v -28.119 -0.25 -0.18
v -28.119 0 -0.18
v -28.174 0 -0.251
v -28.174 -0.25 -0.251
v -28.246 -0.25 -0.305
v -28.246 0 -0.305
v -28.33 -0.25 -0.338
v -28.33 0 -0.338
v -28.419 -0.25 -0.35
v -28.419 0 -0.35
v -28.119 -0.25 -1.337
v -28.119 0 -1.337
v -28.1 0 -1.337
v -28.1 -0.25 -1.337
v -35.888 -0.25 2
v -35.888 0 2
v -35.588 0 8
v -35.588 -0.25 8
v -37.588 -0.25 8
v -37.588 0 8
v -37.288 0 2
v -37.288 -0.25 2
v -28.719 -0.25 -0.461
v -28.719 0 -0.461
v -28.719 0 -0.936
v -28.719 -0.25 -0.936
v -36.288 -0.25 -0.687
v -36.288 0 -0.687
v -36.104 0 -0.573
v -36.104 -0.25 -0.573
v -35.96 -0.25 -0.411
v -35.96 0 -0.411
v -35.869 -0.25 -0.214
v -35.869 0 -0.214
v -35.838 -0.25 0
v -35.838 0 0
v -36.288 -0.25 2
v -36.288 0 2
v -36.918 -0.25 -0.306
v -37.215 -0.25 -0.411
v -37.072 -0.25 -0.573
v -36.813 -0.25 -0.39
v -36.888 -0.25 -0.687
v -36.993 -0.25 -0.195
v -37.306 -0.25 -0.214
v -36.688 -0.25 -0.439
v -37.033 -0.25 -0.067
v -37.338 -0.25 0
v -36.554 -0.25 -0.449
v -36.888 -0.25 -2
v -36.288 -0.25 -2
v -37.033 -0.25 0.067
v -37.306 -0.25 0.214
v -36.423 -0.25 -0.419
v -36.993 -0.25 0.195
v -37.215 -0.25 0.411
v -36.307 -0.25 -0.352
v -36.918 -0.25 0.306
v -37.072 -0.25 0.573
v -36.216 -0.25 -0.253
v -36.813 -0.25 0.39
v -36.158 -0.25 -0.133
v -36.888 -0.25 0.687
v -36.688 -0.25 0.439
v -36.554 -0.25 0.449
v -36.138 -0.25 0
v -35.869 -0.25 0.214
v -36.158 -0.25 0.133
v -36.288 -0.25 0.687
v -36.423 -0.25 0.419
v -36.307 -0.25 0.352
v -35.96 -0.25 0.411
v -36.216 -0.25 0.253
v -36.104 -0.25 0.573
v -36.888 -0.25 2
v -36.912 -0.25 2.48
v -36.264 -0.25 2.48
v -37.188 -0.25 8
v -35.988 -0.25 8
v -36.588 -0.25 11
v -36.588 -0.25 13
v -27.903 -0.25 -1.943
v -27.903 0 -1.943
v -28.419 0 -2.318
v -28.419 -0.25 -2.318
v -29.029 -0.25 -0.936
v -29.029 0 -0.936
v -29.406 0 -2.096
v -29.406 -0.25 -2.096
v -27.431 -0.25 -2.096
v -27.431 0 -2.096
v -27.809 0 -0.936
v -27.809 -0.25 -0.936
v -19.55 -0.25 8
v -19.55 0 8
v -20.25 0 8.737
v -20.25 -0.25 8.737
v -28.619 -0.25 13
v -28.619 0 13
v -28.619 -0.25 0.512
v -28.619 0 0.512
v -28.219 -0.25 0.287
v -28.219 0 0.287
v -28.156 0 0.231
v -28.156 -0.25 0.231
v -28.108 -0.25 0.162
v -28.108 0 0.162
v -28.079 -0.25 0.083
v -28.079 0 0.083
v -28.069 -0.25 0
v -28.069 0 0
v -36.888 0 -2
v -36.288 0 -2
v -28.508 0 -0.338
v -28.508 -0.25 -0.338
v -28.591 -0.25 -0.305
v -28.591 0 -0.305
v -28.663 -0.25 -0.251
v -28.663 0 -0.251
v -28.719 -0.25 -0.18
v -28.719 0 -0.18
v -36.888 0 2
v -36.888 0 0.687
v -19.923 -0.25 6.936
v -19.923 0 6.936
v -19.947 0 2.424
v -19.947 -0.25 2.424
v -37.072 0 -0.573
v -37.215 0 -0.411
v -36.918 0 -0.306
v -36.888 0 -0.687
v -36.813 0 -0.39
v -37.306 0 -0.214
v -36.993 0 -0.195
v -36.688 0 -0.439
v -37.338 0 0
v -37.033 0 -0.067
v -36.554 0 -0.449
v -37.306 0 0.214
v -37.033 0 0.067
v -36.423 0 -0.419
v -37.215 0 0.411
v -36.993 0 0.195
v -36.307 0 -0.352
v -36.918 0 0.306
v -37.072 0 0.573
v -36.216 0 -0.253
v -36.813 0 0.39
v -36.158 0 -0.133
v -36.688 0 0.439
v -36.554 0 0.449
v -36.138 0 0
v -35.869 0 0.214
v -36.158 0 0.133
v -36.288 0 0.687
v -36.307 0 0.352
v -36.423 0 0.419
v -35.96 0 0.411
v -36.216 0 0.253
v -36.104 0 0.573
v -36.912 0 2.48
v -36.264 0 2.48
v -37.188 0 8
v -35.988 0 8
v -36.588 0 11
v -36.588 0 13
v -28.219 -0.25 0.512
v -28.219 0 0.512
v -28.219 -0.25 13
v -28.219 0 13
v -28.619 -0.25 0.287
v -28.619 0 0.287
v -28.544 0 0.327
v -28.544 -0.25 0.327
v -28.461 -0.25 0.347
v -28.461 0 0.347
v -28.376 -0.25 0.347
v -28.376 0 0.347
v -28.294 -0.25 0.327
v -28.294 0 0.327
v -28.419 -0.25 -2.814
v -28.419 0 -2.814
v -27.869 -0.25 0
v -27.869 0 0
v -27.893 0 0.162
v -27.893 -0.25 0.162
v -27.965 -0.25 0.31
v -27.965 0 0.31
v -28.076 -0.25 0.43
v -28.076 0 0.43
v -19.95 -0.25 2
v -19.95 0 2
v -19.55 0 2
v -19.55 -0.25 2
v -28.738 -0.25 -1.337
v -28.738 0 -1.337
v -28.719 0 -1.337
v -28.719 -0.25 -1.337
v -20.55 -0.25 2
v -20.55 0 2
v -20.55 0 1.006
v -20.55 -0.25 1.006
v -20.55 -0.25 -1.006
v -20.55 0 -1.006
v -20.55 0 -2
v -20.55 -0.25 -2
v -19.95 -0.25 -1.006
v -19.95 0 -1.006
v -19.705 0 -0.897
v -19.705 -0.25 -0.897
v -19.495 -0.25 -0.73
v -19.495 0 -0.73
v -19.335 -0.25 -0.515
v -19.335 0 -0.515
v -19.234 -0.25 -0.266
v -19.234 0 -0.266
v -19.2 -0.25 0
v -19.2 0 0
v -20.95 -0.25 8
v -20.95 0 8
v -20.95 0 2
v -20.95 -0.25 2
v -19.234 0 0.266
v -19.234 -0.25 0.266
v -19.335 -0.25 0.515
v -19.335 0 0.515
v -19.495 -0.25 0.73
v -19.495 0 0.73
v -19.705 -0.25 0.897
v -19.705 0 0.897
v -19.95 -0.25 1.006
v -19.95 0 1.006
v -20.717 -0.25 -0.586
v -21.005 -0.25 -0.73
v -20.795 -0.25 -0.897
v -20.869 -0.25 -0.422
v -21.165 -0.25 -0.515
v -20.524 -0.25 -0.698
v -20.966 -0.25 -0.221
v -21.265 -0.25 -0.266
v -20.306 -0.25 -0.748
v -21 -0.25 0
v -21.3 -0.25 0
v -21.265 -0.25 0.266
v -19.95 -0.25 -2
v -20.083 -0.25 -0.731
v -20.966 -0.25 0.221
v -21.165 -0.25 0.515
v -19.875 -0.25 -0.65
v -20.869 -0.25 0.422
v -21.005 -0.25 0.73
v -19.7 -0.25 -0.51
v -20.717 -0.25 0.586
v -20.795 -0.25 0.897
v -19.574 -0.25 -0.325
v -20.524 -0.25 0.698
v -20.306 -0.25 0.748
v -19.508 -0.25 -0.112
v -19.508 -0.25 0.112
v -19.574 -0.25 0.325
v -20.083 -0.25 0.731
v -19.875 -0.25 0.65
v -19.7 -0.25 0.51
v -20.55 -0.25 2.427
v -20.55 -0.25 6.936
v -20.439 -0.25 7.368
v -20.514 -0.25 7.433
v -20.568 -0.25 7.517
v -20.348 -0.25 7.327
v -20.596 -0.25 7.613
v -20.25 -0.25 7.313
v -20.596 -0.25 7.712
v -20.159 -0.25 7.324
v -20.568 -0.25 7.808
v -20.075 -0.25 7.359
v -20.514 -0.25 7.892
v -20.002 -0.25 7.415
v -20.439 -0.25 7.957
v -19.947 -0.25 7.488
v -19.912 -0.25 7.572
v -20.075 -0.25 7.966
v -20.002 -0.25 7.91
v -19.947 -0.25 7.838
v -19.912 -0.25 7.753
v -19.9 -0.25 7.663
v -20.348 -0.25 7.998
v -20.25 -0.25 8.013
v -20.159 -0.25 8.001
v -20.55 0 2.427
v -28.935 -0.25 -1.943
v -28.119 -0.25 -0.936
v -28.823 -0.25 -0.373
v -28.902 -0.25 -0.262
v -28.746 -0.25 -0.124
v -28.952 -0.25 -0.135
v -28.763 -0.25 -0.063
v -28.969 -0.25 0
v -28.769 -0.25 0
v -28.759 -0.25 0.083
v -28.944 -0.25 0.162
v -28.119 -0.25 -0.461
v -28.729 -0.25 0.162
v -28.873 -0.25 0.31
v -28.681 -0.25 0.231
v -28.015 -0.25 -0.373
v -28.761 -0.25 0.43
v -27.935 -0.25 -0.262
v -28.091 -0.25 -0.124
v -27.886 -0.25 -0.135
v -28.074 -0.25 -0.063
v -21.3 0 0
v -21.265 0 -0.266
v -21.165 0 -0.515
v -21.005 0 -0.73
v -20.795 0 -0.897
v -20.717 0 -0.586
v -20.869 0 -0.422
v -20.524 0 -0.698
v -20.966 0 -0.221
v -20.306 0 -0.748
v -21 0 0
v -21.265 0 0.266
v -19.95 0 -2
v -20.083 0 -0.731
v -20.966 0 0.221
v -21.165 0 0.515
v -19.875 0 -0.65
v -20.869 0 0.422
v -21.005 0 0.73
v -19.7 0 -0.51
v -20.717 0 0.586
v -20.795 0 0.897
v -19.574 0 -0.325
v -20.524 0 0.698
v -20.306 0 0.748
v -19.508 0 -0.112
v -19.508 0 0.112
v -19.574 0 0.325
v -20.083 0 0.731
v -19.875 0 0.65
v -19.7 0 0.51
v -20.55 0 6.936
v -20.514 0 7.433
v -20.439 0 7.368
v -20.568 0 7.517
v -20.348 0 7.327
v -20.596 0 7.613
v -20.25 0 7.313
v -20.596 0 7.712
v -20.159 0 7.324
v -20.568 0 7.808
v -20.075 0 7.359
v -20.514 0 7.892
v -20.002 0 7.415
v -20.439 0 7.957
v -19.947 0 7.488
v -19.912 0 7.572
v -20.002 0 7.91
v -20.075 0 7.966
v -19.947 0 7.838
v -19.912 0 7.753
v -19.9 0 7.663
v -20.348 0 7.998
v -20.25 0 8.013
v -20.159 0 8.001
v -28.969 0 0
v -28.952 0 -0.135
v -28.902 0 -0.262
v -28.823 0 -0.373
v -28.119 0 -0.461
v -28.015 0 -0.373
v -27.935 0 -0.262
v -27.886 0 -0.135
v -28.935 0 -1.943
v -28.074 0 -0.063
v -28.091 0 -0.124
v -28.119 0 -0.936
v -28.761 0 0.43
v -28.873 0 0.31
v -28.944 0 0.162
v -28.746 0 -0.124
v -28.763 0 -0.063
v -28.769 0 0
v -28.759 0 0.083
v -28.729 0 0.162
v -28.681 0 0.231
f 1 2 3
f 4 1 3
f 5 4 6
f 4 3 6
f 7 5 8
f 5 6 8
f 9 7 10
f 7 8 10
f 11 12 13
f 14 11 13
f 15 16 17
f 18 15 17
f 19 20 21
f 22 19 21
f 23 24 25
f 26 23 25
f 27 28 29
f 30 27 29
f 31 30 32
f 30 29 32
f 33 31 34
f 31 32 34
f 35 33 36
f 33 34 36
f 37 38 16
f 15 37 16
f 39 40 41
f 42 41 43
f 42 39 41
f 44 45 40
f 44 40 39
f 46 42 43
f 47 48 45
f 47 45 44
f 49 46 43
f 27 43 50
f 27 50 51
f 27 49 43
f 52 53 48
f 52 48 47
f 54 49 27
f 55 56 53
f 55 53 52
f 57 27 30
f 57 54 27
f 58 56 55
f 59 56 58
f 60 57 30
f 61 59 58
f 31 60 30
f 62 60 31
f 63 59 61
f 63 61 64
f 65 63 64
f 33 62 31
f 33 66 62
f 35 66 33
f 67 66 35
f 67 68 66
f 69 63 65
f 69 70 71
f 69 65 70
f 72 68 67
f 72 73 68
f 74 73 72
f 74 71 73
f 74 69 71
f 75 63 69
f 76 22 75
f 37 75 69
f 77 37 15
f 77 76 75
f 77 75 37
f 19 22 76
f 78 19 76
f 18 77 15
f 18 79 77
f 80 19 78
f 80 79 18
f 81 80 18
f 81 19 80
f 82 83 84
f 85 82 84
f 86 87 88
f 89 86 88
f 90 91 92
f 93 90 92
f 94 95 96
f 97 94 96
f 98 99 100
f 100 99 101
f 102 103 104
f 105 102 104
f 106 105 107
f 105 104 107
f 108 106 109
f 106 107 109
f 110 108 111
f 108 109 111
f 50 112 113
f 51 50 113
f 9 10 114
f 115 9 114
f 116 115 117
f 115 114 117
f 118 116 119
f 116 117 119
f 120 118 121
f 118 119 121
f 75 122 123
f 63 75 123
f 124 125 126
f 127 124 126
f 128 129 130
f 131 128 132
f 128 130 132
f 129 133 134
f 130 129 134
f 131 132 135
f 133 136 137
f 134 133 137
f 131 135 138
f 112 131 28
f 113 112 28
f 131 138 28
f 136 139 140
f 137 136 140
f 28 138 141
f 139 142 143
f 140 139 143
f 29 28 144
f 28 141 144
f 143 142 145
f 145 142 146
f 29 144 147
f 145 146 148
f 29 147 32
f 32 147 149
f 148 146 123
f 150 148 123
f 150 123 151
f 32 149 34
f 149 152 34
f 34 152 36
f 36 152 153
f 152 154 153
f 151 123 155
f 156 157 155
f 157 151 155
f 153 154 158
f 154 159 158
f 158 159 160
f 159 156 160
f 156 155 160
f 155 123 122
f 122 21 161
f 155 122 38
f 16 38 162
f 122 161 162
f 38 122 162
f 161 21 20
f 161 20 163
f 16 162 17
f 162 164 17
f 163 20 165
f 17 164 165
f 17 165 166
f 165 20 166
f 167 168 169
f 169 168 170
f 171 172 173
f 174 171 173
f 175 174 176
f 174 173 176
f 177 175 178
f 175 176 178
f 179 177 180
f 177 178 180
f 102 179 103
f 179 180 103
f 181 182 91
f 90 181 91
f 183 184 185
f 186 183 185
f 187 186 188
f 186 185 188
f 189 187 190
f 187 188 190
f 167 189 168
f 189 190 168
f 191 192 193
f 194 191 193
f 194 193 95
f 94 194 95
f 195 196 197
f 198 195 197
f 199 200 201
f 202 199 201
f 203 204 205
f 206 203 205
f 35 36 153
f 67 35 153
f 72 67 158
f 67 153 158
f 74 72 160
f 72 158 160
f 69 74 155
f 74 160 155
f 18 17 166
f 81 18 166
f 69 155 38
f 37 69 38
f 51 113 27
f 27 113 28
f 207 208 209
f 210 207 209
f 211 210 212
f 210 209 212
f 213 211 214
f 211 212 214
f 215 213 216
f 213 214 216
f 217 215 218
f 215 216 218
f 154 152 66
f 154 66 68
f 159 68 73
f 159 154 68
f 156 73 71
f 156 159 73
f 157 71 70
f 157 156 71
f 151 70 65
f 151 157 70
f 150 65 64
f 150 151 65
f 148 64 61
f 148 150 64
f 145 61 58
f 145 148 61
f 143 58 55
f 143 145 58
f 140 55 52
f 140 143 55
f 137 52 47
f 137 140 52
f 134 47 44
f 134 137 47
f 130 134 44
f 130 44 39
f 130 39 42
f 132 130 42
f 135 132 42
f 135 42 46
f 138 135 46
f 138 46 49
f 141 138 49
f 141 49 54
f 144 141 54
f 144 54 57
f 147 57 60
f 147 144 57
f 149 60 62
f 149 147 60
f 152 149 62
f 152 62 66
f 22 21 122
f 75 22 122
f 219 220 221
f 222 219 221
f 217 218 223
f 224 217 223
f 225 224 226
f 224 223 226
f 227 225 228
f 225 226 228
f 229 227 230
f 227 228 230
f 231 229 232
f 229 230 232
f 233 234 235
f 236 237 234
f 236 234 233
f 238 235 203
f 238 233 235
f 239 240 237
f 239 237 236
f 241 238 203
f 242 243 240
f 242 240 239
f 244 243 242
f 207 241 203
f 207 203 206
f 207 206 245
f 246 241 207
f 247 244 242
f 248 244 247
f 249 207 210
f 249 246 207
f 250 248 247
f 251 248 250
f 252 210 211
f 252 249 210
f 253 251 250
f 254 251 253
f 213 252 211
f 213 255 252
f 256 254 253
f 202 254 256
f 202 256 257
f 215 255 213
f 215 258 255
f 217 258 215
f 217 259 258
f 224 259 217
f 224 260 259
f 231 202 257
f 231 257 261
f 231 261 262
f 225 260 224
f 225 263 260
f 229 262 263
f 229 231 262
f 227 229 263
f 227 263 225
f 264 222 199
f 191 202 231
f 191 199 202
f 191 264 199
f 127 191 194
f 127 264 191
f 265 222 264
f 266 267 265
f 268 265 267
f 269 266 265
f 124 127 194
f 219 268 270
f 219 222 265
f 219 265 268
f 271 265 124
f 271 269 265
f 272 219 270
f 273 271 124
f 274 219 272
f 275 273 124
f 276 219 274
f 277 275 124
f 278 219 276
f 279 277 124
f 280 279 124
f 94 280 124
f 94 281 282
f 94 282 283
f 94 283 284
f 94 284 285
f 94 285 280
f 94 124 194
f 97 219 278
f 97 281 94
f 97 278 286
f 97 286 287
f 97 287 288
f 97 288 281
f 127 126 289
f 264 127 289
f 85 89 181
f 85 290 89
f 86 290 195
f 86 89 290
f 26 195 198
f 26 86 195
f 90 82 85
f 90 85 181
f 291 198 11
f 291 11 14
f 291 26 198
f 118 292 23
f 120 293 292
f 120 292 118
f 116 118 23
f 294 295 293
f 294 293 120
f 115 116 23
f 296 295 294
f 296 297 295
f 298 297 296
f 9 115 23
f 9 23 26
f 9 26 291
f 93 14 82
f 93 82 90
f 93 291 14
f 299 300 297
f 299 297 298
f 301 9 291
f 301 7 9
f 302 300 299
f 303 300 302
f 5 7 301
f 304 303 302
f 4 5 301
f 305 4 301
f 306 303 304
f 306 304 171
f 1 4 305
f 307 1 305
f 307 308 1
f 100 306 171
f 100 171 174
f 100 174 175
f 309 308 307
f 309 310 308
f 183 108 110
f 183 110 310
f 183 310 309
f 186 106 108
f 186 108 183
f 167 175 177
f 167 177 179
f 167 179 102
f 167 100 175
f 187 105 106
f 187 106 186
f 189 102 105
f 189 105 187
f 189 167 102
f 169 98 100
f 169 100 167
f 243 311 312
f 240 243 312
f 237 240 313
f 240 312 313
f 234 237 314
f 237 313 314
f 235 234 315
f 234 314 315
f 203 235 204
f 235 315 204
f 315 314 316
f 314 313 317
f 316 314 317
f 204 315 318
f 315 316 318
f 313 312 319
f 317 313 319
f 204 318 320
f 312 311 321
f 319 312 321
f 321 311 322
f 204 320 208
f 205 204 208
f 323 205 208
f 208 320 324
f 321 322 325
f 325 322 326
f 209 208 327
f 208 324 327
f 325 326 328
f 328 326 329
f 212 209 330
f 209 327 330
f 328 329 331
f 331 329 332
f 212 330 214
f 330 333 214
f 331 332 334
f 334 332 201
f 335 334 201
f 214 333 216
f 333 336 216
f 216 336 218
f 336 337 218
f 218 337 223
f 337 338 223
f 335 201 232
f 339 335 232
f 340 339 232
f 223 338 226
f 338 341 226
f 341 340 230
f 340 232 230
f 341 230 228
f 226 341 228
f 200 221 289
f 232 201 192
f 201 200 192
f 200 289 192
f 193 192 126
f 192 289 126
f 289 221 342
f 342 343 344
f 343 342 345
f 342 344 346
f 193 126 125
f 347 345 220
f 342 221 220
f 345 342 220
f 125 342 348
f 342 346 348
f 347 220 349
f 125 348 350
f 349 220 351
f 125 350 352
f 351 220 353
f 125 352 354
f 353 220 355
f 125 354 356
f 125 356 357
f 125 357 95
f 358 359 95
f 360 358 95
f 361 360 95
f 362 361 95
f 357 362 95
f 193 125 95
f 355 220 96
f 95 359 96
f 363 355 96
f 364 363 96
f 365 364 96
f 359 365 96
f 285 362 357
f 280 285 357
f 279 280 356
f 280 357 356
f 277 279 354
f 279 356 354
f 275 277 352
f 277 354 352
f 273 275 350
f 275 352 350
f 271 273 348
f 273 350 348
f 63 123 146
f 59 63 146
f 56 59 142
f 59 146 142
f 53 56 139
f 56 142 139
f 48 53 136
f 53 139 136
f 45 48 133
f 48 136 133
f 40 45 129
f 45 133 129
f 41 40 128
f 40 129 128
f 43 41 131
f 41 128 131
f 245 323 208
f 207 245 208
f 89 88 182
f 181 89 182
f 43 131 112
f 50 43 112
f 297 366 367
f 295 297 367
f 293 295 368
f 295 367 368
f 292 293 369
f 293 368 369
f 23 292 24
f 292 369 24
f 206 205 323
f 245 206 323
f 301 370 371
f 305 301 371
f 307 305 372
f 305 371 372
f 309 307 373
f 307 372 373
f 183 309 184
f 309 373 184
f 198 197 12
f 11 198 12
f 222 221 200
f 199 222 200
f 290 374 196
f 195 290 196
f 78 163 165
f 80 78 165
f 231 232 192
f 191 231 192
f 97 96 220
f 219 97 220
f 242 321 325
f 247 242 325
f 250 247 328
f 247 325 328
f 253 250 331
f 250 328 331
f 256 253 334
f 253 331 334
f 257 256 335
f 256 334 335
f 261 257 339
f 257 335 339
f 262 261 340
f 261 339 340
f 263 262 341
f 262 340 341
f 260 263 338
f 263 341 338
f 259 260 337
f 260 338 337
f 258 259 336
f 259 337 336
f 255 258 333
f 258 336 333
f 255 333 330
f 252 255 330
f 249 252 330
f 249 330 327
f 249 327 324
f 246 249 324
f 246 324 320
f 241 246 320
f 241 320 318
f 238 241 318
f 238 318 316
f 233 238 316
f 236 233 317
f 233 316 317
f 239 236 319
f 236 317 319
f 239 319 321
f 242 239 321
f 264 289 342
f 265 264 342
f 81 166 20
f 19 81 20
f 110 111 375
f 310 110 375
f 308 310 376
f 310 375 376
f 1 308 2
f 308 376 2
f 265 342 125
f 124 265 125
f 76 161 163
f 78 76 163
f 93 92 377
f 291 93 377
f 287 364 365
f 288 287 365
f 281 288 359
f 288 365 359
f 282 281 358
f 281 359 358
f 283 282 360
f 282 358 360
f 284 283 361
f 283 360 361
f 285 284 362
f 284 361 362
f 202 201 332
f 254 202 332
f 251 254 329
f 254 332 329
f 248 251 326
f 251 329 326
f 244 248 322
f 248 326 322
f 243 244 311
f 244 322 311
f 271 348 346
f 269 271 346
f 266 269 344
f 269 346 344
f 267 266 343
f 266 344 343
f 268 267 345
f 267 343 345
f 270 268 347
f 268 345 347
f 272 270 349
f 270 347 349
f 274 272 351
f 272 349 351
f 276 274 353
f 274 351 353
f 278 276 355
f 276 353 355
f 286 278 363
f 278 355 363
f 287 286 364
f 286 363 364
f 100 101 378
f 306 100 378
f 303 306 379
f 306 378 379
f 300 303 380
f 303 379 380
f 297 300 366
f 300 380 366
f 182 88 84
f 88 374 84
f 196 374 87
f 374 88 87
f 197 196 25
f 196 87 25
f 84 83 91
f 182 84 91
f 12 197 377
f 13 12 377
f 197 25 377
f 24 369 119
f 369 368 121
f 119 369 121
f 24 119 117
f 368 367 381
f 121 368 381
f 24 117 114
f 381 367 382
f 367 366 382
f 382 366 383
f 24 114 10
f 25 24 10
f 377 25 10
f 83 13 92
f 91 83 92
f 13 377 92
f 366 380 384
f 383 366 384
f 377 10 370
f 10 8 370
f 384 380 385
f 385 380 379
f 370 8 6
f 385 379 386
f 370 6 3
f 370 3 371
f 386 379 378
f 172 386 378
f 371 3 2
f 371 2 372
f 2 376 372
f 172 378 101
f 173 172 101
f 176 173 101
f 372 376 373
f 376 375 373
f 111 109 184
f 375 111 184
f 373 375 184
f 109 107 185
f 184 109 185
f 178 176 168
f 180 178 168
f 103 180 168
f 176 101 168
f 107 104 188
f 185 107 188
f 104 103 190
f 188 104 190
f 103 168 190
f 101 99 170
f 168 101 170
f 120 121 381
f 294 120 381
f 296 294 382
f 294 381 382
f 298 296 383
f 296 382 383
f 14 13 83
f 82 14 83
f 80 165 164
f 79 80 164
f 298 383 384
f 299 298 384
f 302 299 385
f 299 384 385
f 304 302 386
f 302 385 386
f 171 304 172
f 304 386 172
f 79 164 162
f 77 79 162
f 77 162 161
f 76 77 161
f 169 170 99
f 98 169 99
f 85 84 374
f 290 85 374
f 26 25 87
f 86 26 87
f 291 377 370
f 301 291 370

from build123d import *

# Parameters (mm, degrees)
F1_DEPTH = 0.25
F0_W     = 0.3
F0_H     = 0.4009734839
F0_R     = 0.45


# Not quite as in the source:
# - a feature names something its author has since deleted; it is built from what else it names


with BuildPart() as f1:
    # F0 (on Front) → F1 (new body)
    with BuildSketch(Plane.XZ):
        with BuildLine():
            ThreePointArc((-20.5497518182, 1.0062305899), (-21.0916247302, 0.6274950199), (-21.2997518182, 0))
            ThreePointArc((-21.2997518182, 0), (-21.0916247302, -0.6274950199), (-20.5497518182, -1.0062305899))
            ThreePointArc((-20.5497518182, -1.0062305899), (-20.2497518182, -1.05), (-19.9497518182, -1.0062305899))
            ThreePointArc((-19.9497518182, -1.0062305899), (-19.4078789062, -0.6274950199), (-19.1997518182, 0))
            ThreePointArc((-19.1997518182, 0), (-19.4078789062, 0.6274950199), (-19.9497518182, 1.0062305899))
            ThreePointArc((-19.9497518182, 1.0062305899), (-20.2497518182, 1.05), (-20.5497518182, 1.0062305899))
        make_face()
        with BuildLine():
            ThreePointArc((-19.4997518182, 0), (-20.2497518182, -0.75), (-20.9997518182, 0))
            ThreePointArc((-20.9997518182, 0), (-20.2497518182, 0.75), (-19.4997518182, 0))
        make_face(mode=Mode.SUBTRACT)
        with BuildLine():
            Line((-20.5497518182, 2), (-20.5497518182, 1.0062305899))
            ThreePointArc((-20.5497518182, 1.0062305899), (-20.2497518182, 1.05), (-19.9497518182, 1.0062305899))
            Line((-19.9497518182, 1.0062305899), (-19.9497518182, 2))
            Line((-19.9497518182, 2), (-19.9474268439, 2.4239178289))
            Line((-19.9474268439, 2.4239178289), (-20.5497518182, 2.4272212759))
            Line((-20.5497518182, 2.4272212759), (-20.5497518182, 2))
        make_face()
        with BuildLine():
            ThreePointArc((-19.9497518182, -1.0062305899), (-20.2497518182, -1.05), (-20.5497518182, -1.0062305899))
            Line((-20.5497518182, -1.0062305899), (-20.5497518182, -2))
            Line((-20.5497518182, -2), (-19.9497518182, -2))
            Line((-19.9497518182, -2), (-19.9497518182, -1.0062305899))
        make_face()
        with BuildLine():
            Line((-20.9497518182, 2), (-20.5497518182, 2))
            Line((-20.5497518182, 2), (-20.5497518182, 2.4272212759))
            Line((-20.5497518182, 2.4272212759), (-20.5497518182, 6.936291784))
            Line((-20.5497518182, 6.936291784), (-20.2497518182, 6.936291784))
            Line((-20.2497518182, 6.936291784), (-20.2497518182, 7.3125319198))
            ThreePointArc((-20.2497518182, 7.3125319198), (-20.5997518182, 7.6625319198), (-20.2497518182, 8.0125319198))
            Line((-20.2497518182, 8.0125319198), (-20.2497518182, 8.7373927236))
            Line((-20.2497518182, 8.7373927236), (-20.9497518182, 8))
            Line((-20.9497518182, 8), (-20.9497518182, 2))
        make_face()
        with BuildLine():
            Line((-19.9474268439, 2.4239178289), (-19.9497518182, 2))
            Line((-19.9497518182, 2), (-19.5497518182, 2))
            Line((-19.5497518182, 2), (-19.5497518182, 8))
            Line((-19.5497518182, 8), (-20.2497518182, 8.7373927236))
            Line((-20.2497518182, 8.7373927236), (-20.2497518182, 8.0125319198))
            ThreePointArc((-20.2497518182, 8.0125319198), (-20.0022644448, 7.9100192932), (-19.8997518182, 7.6625319198))
            ThreePointArc((-19.8997518182, 7.6625319198), (-20.0022644448, 7.4150445464), (-20.2497518182, 7.3125319198))
            Line((-20.2497518182, 7.3125319198), (-20.2497518182, 6.936291784))
            Line((-20.2497518182, 6.936291784), (-19.9226787618, 6.936291784))
            Line((-19.9226787618, 6.936291784), (-19.9474268439, 2.4239178289))
        make_face()
    extrude(amount=F1_DEPTH)


with BuildPart() as f1b:
    # F0 (on Front) → F1, piece 2 (new body)
    with BuildSketch(Plane.XZ):
        with BuildLine():
            ThreePointArc((-28.6187018186, 0.5123475383), (-28.8728493717, 0.3102418412), (-28.9687018186, 0))
            Line((-28.9687018186, 0), (-28.7687018186, 0))
            ThreePointArc((-28.7687018186, 0), (-28.7289436597, 0.1620185175), (-28.6187018186, 0.2872281323))
            Line((-28.6187018186, 0.2872281323), (-28.6187018186, 0.5123475383))
        make_face()
        with BuildLine():
            Line((-28.7687018186, 0), (-28.9687018186, 0))
            ThreePointArc((-28.9687018186, 0), (-28.9021788087, -0.262202212), (-28.7187018186, -0.4609772229))
            Line((-28.7187018186, -0.4609772229), (-28.7187018186, -0.1802775638))
            ThreePointArc((-28.7187018186, -0.1802775638), (-28.7559702577, -0.0935414347), (-28.7687018186, 0))
        make_face()
        with BuildLine():
            Line((-28.6187018186, 13), (-28.6187018186, 0.5123475383))
            ThreePointArc((-28.6187018186, 0.5123475383), (-28.4187018186, 0.55), (-28.2187018186, 0.5123475383))
            Line((-28.2187018186, 0.5123475383), (-28.2187018186, 13))
            Line((-28.2187018186, 13), (-28.6187018186, 13))
        make_face()
        with BuildLine():
            ThreePointArc((-28.2187018186, 0.5123475383), (-28.4187018186, 0.55), (-28.6187018186, 0.5123475383))
            Line((-28.6187018186, 0.5123475383), (-28.6187018186, 0.2872281323))
            ThreePointArc((-28.6187018186, 0.2872281323), (-28.4187018186, 0.35), (-28.2187018186, 0.2872281323))
            Line((-28.2187018186, 0.2872281323), (-28.2187018186, 0.5123475383))
        make_face()
        with BuildLine():
            Line((-28.7187018186, -0.1802775638), (-28.7187018186, -0.4609772229))
            ThreePointArc((-28.7187018186, -0.4609772229), (-28.5751667147, -0.5272748205), (-28.4187018186, -0.55))
            Line((-28.4187018186, -0.55), (-28.4187018186, -0.35))
            ThreePointArc((-28.4187018186, -0.35), (-28.5910428362, -0.3046285831), (-28.7187018186, -0.1802775638))
        make_face()
        with BuildLine():
            ThreePointArc((-28.4187018186, -0.55), (-28.5751667147, -0.5272748205), (-28.7187018186, -0.4609772229))
            Line((-28.7187018186, -0.4609772229), (-28.7187018186, -0.9359067772))
            Line((-28.7187018186, -0.9359067772), (-28.4187018186, -0.9359067772))
            Line((-28.4187018186, -0.9359067772), (-28.4187018186, -0.55))
        make_face()
        with BuildLine():
            ThreePointArc((-27.8687018186, 0), (-27.9645542655, 0.3102418411), (-28.2187018186, 0.5123475383))
            Line((-28.2187018186, 0.5123475383), (-28.2187018186, 0.2872281323))
            ThreePointArc((-28.2187018186, 0.2872281323), (-28.1084599774, 0.1620185175), (-28.0687018186, 0))
            Line((-28.0687018186, 0), (-27.8687018186, 0))
        make_face()
        with BuildLine():
            Line((-28.4187018186, -0.35), (-28.4187018186, -0.55))
            ThreePointArc((-28.4187018186, -0.55), (-28.2622369225, -0.5272748205), (-28.1187018186, -0.4609772229))
            Line((-28.1187018186, -0.4609772229), (-28.1187018186, -0.1802775638))
            ThreePointArc((-28.1187018186, -0.1802775638), (-28.246360801, -0.3046285831), (-28.4187018186, -0.35))
        make_face()
        with BuildLine():
            ThreePointArc((-28.1187018186, -0.4609772229), (-28.2622369225, -0.5272748205), (-28.4187018186, -0.55))
            Line((-28.4187018186, -0.55), (-28.4187018186, -0.9359067772))
            Line((-28.4187018186, -0.9359067772), (-28.1187018186, -0.9359067772))
            Line((-28.1187018186, -0.9359067772), (-28.1187018186, -0.4609772229))
        make_face()
        with Locations((-28.5687018186, -1.1363935191)):
            Rectangle(F0_W, F0_H)
        Polygon((-28.7187018186, -1.3368802611), (-28.7187018186, -0.9359067772), (-29.0288436917, -0.9359067772), (-29.4059321072, -2.0964655857), (-28.4187018186, -2.8137303753), (-28.4187018186, -2.318099892), (-28.9345595064, -1.9433073434), (-28.737519403, -1.3368802611), align=None)
        with BuildLine():
            ThreePointArc((-28.1187018186, -0.4609772229), (-27.9352248284, -0.262202212), (-27.8687018186, 0))
            Line((-27.8687018186, 0), (-28.0687018186, 0))
            ThreePointArc((-28.0687018186, 0), (-28.0814333795, -0.0935414347), (-28.1187018186, -0.1802775638))
            Line((-28.1187018186, -0.1802775638), (-28.1187018186, -0.4609772229))
        make_face()
        with Locations((-28.2687018186, -1.1363935191)):
            Rectangle(F0_W, F0_H)
        Polygon((-27.8085599455, -0.9359067772), (-28.1187018186, -0.9359067772), (-28.1187018186, -1.3368802611), (-28.0998842342, -1.3368802611), (-27.9028441308, -1.9433073434), (-28.4187018186, -2.318099892), (-28.4187018186, -2.8137303753), (-27.43147153, -2.0964655857), align=None)
    extrude(amount=F1_DEPTH)


with BuildPart() as f1c:
    # F0 (on Front) → F1, piece 3 (new body)
    with BuildSketch(Plane.XZ):
        Polygon((-35.587651819, 8), (-36.587651819, 13), (-37.587651819, 8), (-37.287651819, 2), (-36.887651819, 2), (-36.9116376011, 2.4797156414), (-37.187651819, 8), (-36.587651819, 11), (-35.987651819, 8), (-36.2636660369, 2.4797156414), (-36.287651819, 2), (-35.887651819, 2), align=None)
        with BuildLine():
            Line((-36.287651819, 0.6873863542), (-36.287651819, 2))
            Line((-36.287651819, 2), (-36.887651819, 2))
            Line((-36.887651819, 2), (-36.887651819, 0.6873863542))
            ThreePointArc((-36.887651819, 0.6873863542), (-36.587651819, 0.75), (-36.287651819, 0.6873863542))
        make_face()
        Polygon((-36.887651819, 2), (-36.287651819, 2), (-36.2636660369, 2.4797156414), (-36.9116376011, 2.4797156414), align=None)
        with BuildLine():
            ThreePointArc((-35.837651819, 0), (-35.9601567991, 0.4107919181), (-36.287651819, 0.6873863542))
            ThreePointArc((-36.287651819, 0.6873863542), (-36.587651819, 0.75), (-36.887651819, 0.6873863542))
            ThreePointArc((-36.887651819, 0.6873863542), (-37.337651819, 0), (-36.887651819, -0.6873863542))
            ThreePointArc((-36.887651819, -0.6873863542), (-36.587651819, -0.75), (-36.287651819, -0.6873863542))
            ThreePointArc((-36.287651819, -0.6873863542), (-35.9601567991, -0.4107919181), (-35.837651819, 0))
        make_face()
        with Locations((-36.587651819, 0)):
            Circle(F0_R, mode=Mode.SUBTRACT)
        with BuildLine():
            ThreePointArc((-36.287651819, -0.6873863542), (-36.587651819, -0.75), (-36.887651819, -0.6873863542))
            Line((-36.887651819, -0.6873863542), (-36.887651819, -2))
            Line((-36.887651819, -2), (-36.287651819, -2))
            Line((-36.287651819, -2), (-36.287651819, -0.6873863542))
        make_face()
    extrude(amount=F1_DEPTH)


solid = Compound([f1.part, f1b.part, f1c.part])
